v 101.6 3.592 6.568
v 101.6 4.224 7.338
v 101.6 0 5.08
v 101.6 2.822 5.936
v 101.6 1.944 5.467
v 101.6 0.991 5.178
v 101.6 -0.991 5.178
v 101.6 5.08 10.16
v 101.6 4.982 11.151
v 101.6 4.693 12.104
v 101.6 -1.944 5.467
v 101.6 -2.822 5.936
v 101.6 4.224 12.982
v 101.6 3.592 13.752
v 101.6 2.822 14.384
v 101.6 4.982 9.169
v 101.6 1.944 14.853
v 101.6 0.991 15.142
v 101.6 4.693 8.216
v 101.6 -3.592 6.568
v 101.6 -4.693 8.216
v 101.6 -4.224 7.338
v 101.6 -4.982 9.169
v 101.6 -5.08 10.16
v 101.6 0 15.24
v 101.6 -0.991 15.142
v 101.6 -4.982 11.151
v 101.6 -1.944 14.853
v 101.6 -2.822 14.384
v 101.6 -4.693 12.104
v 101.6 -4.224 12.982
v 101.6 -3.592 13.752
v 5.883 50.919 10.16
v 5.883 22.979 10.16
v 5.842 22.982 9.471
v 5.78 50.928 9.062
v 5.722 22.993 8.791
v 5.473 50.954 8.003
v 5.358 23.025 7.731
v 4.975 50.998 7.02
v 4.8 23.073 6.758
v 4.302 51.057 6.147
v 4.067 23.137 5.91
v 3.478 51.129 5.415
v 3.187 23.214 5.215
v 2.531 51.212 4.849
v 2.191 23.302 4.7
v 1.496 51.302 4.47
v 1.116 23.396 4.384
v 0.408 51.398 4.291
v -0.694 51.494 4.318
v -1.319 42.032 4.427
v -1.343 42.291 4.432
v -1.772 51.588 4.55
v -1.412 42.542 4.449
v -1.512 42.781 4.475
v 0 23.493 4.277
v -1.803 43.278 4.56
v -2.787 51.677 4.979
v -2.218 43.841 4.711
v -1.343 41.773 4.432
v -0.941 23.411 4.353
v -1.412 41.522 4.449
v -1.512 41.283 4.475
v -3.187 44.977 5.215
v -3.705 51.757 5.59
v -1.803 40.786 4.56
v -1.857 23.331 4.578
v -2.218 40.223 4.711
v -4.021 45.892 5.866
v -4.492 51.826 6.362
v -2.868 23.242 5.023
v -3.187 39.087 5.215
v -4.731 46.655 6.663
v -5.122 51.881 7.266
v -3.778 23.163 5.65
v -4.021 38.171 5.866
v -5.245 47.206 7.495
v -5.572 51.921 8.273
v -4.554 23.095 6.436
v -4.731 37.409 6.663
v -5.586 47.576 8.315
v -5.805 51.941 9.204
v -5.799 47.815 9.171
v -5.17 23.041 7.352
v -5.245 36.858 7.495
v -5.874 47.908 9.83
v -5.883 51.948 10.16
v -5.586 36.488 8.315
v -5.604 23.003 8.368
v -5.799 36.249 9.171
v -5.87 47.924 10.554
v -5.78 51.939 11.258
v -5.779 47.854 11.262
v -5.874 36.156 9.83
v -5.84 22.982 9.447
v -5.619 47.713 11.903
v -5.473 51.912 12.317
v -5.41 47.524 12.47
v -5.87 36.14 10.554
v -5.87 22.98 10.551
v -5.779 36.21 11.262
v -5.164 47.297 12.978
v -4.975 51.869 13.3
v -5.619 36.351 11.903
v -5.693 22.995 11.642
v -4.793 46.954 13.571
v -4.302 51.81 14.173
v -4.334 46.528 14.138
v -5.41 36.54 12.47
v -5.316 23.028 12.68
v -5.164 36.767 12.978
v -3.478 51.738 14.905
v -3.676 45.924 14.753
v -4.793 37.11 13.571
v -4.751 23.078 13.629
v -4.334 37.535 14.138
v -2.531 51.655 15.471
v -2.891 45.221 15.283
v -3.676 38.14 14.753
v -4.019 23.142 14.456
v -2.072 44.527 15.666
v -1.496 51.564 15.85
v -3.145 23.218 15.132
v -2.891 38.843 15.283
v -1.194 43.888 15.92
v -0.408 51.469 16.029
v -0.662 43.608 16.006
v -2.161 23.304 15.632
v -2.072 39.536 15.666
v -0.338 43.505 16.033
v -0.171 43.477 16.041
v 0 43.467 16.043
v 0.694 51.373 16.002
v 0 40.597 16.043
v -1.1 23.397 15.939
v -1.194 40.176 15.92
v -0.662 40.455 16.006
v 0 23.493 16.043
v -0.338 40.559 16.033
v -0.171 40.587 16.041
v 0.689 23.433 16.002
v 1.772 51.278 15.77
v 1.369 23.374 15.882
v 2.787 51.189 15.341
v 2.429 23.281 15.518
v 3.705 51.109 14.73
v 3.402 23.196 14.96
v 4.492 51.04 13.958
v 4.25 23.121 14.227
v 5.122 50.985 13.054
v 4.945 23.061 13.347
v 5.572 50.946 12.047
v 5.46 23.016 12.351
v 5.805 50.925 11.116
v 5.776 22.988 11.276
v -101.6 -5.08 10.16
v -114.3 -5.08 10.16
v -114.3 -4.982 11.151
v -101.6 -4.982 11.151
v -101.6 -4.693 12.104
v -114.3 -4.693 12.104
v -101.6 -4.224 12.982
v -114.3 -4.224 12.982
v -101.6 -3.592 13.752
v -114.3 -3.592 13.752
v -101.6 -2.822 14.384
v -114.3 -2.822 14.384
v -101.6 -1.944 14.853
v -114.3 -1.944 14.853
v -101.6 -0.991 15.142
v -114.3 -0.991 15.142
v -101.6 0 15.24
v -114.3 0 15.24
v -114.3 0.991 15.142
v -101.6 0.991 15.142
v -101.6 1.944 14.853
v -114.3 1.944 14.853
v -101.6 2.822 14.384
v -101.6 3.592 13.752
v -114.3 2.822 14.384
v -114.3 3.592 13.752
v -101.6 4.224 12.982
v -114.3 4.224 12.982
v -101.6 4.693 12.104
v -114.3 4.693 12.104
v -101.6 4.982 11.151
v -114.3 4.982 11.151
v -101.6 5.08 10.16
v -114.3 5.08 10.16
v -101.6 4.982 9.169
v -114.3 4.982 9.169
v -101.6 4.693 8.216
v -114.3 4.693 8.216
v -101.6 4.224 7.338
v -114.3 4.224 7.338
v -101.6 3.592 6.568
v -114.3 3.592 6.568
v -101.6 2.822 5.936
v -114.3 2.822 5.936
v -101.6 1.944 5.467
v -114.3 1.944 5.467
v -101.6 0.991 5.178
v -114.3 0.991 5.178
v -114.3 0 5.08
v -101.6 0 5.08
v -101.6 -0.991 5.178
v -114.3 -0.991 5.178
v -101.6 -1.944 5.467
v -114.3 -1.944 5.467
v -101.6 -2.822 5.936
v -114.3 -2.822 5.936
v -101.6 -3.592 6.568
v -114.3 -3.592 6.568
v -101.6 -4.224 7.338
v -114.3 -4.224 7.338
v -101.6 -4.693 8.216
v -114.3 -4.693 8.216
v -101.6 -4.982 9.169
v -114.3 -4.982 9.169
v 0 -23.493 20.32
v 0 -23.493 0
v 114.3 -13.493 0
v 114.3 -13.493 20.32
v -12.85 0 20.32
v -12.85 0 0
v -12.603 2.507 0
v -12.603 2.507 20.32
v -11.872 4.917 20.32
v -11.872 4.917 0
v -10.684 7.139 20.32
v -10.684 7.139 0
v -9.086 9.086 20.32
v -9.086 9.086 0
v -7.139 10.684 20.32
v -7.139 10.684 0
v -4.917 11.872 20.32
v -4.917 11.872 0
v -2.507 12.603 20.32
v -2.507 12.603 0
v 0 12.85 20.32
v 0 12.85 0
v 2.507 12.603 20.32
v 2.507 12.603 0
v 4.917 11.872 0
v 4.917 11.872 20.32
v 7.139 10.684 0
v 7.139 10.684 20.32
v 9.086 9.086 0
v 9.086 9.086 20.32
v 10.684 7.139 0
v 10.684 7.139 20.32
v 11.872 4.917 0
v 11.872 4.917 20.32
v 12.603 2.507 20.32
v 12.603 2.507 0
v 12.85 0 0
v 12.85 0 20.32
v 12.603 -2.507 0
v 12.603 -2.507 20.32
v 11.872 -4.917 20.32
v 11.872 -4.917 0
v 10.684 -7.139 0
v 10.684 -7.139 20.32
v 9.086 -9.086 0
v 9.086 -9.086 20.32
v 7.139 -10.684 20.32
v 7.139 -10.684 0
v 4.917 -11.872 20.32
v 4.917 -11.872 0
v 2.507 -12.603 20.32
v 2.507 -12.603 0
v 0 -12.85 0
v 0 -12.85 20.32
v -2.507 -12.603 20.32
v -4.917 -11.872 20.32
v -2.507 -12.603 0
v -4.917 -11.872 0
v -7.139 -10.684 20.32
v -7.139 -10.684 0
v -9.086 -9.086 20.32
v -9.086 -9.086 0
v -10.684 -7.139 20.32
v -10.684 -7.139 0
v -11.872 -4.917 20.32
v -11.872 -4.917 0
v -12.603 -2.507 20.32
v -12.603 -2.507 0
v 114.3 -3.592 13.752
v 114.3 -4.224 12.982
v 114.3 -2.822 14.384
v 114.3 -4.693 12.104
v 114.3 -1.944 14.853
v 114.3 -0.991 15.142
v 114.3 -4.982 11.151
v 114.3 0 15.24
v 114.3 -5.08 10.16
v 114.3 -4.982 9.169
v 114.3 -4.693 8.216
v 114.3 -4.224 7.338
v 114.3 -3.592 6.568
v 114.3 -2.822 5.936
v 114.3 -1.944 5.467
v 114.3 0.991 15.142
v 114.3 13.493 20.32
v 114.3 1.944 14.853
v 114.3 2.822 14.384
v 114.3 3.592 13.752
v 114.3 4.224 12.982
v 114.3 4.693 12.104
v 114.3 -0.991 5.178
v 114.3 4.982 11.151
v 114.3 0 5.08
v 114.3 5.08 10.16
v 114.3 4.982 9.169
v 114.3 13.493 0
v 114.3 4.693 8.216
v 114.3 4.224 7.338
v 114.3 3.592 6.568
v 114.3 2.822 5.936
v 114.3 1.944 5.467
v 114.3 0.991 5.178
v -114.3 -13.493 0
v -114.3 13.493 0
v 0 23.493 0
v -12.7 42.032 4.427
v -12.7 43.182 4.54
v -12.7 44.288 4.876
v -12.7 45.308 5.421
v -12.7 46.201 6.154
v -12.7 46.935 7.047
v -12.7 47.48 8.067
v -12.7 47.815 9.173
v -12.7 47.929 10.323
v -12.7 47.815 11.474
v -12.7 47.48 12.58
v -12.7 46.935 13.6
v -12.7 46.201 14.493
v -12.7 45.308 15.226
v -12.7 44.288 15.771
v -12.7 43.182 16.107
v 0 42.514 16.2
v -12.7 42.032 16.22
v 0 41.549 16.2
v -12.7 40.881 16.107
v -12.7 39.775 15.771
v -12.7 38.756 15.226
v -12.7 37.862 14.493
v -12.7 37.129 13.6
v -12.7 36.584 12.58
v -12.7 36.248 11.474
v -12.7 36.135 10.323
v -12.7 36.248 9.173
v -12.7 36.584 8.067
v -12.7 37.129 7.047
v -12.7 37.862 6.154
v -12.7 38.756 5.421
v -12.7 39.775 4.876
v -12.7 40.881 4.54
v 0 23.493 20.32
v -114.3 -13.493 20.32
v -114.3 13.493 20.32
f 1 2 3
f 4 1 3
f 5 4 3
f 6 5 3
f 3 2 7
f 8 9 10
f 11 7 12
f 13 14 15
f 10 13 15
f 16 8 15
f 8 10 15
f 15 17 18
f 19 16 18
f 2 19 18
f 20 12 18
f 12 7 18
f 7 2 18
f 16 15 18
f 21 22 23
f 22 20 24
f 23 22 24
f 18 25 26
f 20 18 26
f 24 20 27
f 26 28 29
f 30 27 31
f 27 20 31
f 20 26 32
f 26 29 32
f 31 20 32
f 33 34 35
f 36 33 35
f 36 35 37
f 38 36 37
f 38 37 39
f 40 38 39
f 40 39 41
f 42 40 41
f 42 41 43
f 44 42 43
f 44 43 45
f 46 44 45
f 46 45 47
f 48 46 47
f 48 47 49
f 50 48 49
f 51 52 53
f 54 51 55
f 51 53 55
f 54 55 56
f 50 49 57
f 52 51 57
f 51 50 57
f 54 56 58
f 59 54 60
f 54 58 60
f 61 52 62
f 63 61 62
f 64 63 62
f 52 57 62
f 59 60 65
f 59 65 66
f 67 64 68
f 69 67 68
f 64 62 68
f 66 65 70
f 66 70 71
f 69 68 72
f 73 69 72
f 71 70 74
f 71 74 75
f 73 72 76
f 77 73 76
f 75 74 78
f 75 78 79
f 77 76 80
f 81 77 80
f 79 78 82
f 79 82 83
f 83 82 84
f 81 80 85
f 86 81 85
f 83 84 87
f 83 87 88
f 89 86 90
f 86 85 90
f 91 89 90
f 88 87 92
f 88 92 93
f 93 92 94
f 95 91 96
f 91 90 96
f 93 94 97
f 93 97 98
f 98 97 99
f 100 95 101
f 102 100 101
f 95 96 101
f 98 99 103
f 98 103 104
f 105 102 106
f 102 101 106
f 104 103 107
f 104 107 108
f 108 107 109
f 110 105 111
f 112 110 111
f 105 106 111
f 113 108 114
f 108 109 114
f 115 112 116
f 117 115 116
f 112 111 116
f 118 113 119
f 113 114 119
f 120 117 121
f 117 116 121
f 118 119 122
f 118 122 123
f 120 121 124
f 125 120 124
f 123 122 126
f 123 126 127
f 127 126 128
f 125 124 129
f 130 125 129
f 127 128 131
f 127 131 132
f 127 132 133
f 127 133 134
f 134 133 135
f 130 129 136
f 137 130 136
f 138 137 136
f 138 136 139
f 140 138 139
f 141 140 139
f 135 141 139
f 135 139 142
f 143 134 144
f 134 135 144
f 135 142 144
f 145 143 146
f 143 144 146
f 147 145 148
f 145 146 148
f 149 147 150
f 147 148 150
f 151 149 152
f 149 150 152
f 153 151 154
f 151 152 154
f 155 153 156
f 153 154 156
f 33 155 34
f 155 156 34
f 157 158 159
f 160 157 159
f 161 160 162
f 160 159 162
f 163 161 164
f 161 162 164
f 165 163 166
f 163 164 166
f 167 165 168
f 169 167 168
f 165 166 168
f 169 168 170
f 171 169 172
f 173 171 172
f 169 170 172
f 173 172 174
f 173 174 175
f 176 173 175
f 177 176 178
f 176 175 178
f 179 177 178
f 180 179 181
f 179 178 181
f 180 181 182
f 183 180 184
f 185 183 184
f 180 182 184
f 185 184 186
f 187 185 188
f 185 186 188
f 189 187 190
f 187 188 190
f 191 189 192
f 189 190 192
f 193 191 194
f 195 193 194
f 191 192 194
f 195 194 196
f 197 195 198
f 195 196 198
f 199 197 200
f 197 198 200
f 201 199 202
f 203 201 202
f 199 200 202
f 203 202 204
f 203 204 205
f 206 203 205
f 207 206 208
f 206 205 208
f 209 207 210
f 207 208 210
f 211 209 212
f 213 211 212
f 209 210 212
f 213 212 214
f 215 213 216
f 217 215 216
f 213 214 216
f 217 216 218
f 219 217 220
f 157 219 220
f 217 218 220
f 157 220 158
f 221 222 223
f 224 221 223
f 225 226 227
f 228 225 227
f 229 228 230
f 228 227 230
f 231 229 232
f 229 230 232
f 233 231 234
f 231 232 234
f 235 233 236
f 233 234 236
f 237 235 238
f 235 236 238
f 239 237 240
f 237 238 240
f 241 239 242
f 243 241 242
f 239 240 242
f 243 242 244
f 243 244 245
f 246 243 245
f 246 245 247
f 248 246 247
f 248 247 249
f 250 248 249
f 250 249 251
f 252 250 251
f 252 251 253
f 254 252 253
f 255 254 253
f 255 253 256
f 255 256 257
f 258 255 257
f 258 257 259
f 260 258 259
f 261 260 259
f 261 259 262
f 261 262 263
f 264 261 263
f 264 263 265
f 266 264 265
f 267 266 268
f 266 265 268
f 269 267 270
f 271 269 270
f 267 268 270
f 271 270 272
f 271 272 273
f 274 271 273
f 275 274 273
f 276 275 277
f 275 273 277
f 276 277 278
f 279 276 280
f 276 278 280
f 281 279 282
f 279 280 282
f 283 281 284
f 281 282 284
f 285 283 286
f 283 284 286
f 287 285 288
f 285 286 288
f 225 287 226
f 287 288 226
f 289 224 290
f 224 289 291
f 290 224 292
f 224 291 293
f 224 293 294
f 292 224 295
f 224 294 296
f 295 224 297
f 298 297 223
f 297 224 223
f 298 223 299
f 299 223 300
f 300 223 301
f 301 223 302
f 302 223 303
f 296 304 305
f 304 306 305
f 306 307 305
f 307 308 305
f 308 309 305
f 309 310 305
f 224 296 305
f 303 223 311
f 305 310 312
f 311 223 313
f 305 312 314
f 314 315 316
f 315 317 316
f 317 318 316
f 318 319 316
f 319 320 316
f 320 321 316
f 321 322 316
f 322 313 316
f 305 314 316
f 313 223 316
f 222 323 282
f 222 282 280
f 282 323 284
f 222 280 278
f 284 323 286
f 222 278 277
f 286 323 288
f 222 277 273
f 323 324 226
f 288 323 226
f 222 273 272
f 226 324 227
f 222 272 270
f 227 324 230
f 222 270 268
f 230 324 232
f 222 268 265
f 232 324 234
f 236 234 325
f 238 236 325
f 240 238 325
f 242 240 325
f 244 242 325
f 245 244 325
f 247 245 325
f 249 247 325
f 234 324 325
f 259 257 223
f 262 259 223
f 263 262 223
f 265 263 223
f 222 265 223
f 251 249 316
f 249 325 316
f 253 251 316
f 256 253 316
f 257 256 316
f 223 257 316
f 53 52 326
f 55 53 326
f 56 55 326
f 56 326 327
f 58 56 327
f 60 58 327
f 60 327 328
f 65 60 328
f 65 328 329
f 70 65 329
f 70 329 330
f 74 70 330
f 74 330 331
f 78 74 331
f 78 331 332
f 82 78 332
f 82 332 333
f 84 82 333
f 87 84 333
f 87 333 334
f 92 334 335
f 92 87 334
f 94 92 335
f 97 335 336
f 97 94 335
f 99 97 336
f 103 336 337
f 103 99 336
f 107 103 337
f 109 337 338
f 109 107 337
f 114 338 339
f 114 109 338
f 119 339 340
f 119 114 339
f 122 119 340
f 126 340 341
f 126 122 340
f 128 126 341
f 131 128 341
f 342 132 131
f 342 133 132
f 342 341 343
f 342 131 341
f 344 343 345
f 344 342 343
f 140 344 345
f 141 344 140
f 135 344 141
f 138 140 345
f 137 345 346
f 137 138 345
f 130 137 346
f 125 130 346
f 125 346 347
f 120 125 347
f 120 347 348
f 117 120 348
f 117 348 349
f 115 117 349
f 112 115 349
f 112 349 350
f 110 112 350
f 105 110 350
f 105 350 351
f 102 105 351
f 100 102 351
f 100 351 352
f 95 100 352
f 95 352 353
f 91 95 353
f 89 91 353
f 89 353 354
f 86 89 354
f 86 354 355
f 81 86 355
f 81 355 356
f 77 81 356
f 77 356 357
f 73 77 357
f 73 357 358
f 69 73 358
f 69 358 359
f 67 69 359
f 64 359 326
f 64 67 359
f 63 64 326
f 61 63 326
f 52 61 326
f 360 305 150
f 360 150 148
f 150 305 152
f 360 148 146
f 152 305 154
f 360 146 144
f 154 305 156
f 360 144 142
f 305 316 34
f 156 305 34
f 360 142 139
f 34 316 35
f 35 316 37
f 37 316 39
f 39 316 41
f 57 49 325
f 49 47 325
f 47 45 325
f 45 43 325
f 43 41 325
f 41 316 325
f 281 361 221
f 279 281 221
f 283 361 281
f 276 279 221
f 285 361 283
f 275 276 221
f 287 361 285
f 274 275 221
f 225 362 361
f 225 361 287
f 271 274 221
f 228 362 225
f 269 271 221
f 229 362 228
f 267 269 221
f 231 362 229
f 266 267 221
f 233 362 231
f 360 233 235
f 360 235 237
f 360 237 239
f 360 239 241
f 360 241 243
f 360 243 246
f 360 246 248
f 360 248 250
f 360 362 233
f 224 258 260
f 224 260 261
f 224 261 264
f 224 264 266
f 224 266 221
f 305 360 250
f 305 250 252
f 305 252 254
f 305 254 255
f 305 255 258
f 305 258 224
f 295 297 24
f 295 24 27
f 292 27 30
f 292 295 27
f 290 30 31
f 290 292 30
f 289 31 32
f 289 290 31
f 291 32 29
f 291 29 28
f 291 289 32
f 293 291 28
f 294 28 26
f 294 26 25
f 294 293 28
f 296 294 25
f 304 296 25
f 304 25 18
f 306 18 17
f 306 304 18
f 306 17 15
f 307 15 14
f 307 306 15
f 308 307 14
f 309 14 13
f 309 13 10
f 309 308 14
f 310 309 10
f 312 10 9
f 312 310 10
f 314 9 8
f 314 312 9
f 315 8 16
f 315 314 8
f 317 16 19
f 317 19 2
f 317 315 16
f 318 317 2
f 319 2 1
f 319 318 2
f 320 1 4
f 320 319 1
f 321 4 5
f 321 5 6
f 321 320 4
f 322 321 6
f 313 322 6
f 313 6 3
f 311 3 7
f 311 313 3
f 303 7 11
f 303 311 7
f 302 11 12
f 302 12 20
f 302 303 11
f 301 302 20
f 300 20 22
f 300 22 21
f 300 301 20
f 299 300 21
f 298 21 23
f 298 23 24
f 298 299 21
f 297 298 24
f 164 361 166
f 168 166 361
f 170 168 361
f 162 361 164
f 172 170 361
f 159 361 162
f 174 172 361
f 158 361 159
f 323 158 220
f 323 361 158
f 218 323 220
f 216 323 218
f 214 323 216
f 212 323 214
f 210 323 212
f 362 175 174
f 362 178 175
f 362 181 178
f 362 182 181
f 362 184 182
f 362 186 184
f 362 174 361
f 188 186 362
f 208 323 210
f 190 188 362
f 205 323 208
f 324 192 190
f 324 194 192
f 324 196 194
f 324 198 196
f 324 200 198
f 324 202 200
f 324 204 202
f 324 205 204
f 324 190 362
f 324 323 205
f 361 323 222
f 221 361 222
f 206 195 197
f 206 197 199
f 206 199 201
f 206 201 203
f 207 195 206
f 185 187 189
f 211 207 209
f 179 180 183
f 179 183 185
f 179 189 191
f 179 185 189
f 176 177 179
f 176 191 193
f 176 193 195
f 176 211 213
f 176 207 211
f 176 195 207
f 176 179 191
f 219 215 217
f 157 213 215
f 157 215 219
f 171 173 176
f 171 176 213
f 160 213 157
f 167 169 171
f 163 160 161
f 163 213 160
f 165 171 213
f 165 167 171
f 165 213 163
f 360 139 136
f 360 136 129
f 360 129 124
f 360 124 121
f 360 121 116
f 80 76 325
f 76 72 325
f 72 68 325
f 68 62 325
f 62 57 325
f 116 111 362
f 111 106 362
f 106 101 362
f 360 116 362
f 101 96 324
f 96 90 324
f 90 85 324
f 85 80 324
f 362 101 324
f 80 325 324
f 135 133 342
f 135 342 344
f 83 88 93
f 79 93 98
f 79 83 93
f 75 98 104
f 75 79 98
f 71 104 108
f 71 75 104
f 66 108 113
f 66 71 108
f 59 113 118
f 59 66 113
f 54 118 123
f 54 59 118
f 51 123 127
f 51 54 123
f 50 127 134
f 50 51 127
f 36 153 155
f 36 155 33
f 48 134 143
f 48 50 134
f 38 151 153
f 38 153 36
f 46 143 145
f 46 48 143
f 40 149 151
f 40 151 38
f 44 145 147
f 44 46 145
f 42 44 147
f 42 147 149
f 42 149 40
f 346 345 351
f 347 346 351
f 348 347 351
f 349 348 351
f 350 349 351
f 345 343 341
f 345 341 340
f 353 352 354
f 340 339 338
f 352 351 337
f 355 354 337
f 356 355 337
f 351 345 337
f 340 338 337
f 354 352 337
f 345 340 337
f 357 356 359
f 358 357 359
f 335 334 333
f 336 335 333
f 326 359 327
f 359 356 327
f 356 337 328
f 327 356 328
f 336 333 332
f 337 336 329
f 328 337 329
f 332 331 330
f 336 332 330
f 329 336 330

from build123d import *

# Parameters (mm, degrees)
BOSS_EXTRUDE1_DEPTH       = 20.32
SKETCH6_R                 = 4
CUT_EXTRUDE3_DEPTH        = 20.32
SKETCH7_R                 = 4
CUT_EXTRUDE4_DEPTH        = 156.533264109
SKETCH2_W                 = 13.462
SKETCH2_H                 = 20.32
CUT_EXTRUDE5_DEPTH        = 25.4
SKETCH3_W                 = 13.462
SKETCH3_H                 = 20.32
CUT_EXTRUDE6_DEPTH        = 25.4
SKETCH8_W                 = 27.94
SKETCH8_H                 = 13.462
CUT_EXTRUDE7_DEPTH        = 12.7
BOSS_EXTRUDE2_START       = 22
BOSS_EXTRUDE2_OUTLINE_R   = 5.882990069
BOSS_EXTRUDE2_DEPTH       = 29.94796736
BOSS_EXTRUDE2_START_2     = 51.237553192
BOSS_EXTRUDE2_2_OUTLINE_W = 15
BOSS_EXTRUDE2_2_OUTLINE_H = 15
BOSS_EXTRUDE2_2_DEPTH     = 1.762446808
SKETCH10_R                = 5.896741512
BOSS_EXTRUDE3_DEPTH       = 12.7
SKETCH11_R                = 12.85
CUT_EXTRUDE8_DEPTH        = 163.287564874
SKETCH12_W                = 70.353248074
SKETCH12_H                = 156.82271979
SKETCH12_W_2              = 82.216902171
CUT_EXTRUDE10_DEPTH       = 35.56
SKETCH13_R                = 5.08
CUT_EXTRUDE11_DEPTH       = 12.7


with BuildPart() as part:
    # Sketch1 → Boss-Extrude1 (new body)
    with BuildSketch(Plane.XY):
        Polygon((-152.4, 10.16), (-152.4, -10.16), (0, -23.493272321), (152.4, -10.16), (152.4, 10.16), (0, 23.493272321), align=None)
    extrude(amount=BOSS_EXTRUDE1_DEPTH)

    # Sketch6 → Cut-Extrude3 (cut)
    with BuildSketch(Plane.XY.offset(20.32)):
        Circle(SKETCH6_R)
    extrude(amount=-CUT_EXTRUDE3_DEPTH, mode=Mode.SUBTRACT)

    # Sketch7 → Cut-Extrude4 (cut, through all)
    with BuildSketch(Plane.XY.offset(20.32)):
        with Locations((-136.525, 0)):
            Circle(SKETCH7_R)
        with Locations((136.525, 0)):
            Circle(SKETCH7_R)
    extrude(amount=-CUT_EXTRUDE4_DEPTH, mode=Mode.SUBTRACT)

    # Sketch2 → Cut-Extrude5 (cut)
    with BuildSketch(Plane.ZY.offset(152.4)):
        with Locations((10.16, 0)):
            Rectangle(SKETCH2_W, SKETCH2_H)
    extrude(amount=-CUT_EXTRUDE5_DEPTH, mode=Mode.SUBTRACT)

    # Sketch3 → Cut-Extrude6 (cut)
    with BuildSketch(Plane(origin=(152.4, 0, 0), x_dir=(0, 0, -1), z_dir=(1, 0, 0))):
        with Locations((-10.16, 0)):
            Rectangle(SKETCH3_W, SKETCH3_H)
    extrude(amount=-CUT_EXTRUDE6_DEPTH, mode=Mode.SUBTRACT)

    # Sketch8 → Cut-Extrude7 (cut, symmetric)
    with BuildSketch(Plane(origin=(0, 0, 0), x_dir=(1, 0, 0), z_dir=(0, 1, 0))):
        with Locations((-138.43, -10.16)):
            Rectangle(SKETCH8_W, SKETCH8_H)
        with Locations((138.43, -10.16)):
            Rectangle(SKETCH8_W, SKETCH8_H)
    extrude(amount=CUT_EXTRUDE7_DEPTH, both=True, mode=Mode.SUBTRACT)

    # Boss-Extrude2: read off the stored shape, not the designer's step
    # Boss-Extrude2 outline → Boss-Extrude2 (add)
    with BuildSketch(Plane(origin=(0, 0, 0), x_dir=(1, 0, 0), z_dir=(0, 1, 0)).offset(BOSS_EXTRUDE2_START)):
        with Locations((0, -10.16)):
            Circle(BOSS_EXTRUDE2_OUTLINE_R)
    extrude(amount=BOSS_EXTRUDE2_DEPTH)

    # Boss-Extrude2 2 outline → Boss-Extrude2 2 (cut)
    with BuildSketch(Plane(origin=(0, 0, 0), x_dir=(0.9961946980917455, -0.08715574274765747, 0), z_dir=(0.08715574274765747, 0.9961946980917457, 0)).offset(BOSS_EXTRUDE2_START_2)):
        with Locations((-4.5, -10.5)):
            Rectangle(BOSS_EXTRUDE2_2_OUTLINE_W, BOSS_EXTRUDE2_2_OUTLINE_H)
    extrude(amount=BOSS_EXTRUDE2_2_DEPTH, mode=Mode.SUBTRACT)

    # Sketch10 → Boss-Extrude3 (add)
    with BuildSketch(Plane(origin=(0, 0, 0), x_dir=(0, 0, -1), z_dir=(1, 0, 0))):
        with Locations((-10.323488307, 42.031861705)):
            Circle(SKETCH10_R)
    extrude(amount=-BOSS_EXTRUDE3_DEPTH)

    # Sketch11 → Cut-Extrude8 (cut, through all)
    with BuildSketch(Plane(origin=(0, 0, 0), x_dir=(-1, 0, 0), z_dir=(0, 0, -1))):
        Circle(SKETCH11_R)
    extrude(amount=-CUT_EXTRUDE8_DEPTH, mode=Mode.SUBTRACT)

    # Sketch12 → Cut-Extrude10 (cut)
    with BuildSketch(Plane.XY):
        with Locations((149.476624037, 0)):
            Rectangle(SKETCH12_W, SKETCH12_H)
        with Locations((-155.408451086, 0)):
            Rectangle(SKETCH12_W_2, SKETCH12_H)
    extrude(amount=CUT_EXTRUDE10_DEPTH, mode=Mode.SUBTRACT)

    # Sketch13 → Cut-Extrude11 (cut)
    with BuildSketch(Plane.ZY.offset(114.3)):
        with Locations(Location((10.16, 0, 0), (0, 0, 270))):
            Circle(SKETCH13_R)
    cut_extrude11 = extrude(amount=-CUT_EXTRUDE11_DEPTH, mode=Mode.SUBTRACT)

    # Mirror1: Cut-Extrude11 across plane
    add(cut_extrude11.mirror(Plane(origin=(0, 0, 0), x_dir=(0, 0, 1), z_dir=(1, 0, 0))), mode=Mode.SUBTRACT)


solid = part.part
